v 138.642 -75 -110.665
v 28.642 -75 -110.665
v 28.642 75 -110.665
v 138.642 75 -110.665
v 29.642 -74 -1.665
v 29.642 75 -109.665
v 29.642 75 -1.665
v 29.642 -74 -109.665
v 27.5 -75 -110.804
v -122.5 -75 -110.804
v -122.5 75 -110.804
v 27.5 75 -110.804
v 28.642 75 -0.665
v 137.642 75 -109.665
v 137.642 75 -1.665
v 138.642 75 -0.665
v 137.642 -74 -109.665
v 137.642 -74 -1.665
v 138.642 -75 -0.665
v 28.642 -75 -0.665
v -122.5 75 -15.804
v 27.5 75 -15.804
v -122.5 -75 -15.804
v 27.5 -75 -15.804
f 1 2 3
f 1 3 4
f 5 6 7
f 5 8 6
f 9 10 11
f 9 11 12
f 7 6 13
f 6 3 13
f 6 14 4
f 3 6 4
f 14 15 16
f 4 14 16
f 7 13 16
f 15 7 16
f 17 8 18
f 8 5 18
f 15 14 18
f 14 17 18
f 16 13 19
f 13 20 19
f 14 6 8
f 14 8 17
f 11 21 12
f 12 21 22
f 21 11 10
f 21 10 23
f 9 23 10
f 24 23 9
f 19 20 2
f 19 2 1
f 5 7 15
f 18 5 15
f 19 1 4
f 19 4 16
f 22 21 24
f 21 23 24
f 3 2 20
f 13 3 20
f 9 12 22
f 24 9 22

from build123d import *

# Parameters (mm, degrees)
F0_W     = 150
F0_H     = 95
F1_DEPTH = 75
F2_W     = 110
F2_H     = 110
F3_DEPTH = 75
F4_T     = -1


with BuildPart() as f1:
    # F0 (on Front) → F1 (new body, symmetric)
    with BuildSketch(Plane.XZ):
        with Locations((-47.5, -63.303723)):
            Rectangle(F0_W, F0_H)
    extrude(amount=F1_DEPTH, both=True)


with BuildPart() as f3:
    # F2 (on Front) → F3 (new body, symmetric)
    with BuildSketch(Plane.XZ):
        with Locations((83.641535, -55.66483)):
            Rectangle(F2_W, F2_H)
    extrude(amount=F3_DEPTH, both=True)

    # F4
    f4_openings = [f3.faces().sort_by_distance(p)[0] for p in [
        (83.641535, 75, -55.66483),
    ]]
    offset(amount=F4_T, openings=f4_openings)


solid = Compound([f1.part, f3.part])
